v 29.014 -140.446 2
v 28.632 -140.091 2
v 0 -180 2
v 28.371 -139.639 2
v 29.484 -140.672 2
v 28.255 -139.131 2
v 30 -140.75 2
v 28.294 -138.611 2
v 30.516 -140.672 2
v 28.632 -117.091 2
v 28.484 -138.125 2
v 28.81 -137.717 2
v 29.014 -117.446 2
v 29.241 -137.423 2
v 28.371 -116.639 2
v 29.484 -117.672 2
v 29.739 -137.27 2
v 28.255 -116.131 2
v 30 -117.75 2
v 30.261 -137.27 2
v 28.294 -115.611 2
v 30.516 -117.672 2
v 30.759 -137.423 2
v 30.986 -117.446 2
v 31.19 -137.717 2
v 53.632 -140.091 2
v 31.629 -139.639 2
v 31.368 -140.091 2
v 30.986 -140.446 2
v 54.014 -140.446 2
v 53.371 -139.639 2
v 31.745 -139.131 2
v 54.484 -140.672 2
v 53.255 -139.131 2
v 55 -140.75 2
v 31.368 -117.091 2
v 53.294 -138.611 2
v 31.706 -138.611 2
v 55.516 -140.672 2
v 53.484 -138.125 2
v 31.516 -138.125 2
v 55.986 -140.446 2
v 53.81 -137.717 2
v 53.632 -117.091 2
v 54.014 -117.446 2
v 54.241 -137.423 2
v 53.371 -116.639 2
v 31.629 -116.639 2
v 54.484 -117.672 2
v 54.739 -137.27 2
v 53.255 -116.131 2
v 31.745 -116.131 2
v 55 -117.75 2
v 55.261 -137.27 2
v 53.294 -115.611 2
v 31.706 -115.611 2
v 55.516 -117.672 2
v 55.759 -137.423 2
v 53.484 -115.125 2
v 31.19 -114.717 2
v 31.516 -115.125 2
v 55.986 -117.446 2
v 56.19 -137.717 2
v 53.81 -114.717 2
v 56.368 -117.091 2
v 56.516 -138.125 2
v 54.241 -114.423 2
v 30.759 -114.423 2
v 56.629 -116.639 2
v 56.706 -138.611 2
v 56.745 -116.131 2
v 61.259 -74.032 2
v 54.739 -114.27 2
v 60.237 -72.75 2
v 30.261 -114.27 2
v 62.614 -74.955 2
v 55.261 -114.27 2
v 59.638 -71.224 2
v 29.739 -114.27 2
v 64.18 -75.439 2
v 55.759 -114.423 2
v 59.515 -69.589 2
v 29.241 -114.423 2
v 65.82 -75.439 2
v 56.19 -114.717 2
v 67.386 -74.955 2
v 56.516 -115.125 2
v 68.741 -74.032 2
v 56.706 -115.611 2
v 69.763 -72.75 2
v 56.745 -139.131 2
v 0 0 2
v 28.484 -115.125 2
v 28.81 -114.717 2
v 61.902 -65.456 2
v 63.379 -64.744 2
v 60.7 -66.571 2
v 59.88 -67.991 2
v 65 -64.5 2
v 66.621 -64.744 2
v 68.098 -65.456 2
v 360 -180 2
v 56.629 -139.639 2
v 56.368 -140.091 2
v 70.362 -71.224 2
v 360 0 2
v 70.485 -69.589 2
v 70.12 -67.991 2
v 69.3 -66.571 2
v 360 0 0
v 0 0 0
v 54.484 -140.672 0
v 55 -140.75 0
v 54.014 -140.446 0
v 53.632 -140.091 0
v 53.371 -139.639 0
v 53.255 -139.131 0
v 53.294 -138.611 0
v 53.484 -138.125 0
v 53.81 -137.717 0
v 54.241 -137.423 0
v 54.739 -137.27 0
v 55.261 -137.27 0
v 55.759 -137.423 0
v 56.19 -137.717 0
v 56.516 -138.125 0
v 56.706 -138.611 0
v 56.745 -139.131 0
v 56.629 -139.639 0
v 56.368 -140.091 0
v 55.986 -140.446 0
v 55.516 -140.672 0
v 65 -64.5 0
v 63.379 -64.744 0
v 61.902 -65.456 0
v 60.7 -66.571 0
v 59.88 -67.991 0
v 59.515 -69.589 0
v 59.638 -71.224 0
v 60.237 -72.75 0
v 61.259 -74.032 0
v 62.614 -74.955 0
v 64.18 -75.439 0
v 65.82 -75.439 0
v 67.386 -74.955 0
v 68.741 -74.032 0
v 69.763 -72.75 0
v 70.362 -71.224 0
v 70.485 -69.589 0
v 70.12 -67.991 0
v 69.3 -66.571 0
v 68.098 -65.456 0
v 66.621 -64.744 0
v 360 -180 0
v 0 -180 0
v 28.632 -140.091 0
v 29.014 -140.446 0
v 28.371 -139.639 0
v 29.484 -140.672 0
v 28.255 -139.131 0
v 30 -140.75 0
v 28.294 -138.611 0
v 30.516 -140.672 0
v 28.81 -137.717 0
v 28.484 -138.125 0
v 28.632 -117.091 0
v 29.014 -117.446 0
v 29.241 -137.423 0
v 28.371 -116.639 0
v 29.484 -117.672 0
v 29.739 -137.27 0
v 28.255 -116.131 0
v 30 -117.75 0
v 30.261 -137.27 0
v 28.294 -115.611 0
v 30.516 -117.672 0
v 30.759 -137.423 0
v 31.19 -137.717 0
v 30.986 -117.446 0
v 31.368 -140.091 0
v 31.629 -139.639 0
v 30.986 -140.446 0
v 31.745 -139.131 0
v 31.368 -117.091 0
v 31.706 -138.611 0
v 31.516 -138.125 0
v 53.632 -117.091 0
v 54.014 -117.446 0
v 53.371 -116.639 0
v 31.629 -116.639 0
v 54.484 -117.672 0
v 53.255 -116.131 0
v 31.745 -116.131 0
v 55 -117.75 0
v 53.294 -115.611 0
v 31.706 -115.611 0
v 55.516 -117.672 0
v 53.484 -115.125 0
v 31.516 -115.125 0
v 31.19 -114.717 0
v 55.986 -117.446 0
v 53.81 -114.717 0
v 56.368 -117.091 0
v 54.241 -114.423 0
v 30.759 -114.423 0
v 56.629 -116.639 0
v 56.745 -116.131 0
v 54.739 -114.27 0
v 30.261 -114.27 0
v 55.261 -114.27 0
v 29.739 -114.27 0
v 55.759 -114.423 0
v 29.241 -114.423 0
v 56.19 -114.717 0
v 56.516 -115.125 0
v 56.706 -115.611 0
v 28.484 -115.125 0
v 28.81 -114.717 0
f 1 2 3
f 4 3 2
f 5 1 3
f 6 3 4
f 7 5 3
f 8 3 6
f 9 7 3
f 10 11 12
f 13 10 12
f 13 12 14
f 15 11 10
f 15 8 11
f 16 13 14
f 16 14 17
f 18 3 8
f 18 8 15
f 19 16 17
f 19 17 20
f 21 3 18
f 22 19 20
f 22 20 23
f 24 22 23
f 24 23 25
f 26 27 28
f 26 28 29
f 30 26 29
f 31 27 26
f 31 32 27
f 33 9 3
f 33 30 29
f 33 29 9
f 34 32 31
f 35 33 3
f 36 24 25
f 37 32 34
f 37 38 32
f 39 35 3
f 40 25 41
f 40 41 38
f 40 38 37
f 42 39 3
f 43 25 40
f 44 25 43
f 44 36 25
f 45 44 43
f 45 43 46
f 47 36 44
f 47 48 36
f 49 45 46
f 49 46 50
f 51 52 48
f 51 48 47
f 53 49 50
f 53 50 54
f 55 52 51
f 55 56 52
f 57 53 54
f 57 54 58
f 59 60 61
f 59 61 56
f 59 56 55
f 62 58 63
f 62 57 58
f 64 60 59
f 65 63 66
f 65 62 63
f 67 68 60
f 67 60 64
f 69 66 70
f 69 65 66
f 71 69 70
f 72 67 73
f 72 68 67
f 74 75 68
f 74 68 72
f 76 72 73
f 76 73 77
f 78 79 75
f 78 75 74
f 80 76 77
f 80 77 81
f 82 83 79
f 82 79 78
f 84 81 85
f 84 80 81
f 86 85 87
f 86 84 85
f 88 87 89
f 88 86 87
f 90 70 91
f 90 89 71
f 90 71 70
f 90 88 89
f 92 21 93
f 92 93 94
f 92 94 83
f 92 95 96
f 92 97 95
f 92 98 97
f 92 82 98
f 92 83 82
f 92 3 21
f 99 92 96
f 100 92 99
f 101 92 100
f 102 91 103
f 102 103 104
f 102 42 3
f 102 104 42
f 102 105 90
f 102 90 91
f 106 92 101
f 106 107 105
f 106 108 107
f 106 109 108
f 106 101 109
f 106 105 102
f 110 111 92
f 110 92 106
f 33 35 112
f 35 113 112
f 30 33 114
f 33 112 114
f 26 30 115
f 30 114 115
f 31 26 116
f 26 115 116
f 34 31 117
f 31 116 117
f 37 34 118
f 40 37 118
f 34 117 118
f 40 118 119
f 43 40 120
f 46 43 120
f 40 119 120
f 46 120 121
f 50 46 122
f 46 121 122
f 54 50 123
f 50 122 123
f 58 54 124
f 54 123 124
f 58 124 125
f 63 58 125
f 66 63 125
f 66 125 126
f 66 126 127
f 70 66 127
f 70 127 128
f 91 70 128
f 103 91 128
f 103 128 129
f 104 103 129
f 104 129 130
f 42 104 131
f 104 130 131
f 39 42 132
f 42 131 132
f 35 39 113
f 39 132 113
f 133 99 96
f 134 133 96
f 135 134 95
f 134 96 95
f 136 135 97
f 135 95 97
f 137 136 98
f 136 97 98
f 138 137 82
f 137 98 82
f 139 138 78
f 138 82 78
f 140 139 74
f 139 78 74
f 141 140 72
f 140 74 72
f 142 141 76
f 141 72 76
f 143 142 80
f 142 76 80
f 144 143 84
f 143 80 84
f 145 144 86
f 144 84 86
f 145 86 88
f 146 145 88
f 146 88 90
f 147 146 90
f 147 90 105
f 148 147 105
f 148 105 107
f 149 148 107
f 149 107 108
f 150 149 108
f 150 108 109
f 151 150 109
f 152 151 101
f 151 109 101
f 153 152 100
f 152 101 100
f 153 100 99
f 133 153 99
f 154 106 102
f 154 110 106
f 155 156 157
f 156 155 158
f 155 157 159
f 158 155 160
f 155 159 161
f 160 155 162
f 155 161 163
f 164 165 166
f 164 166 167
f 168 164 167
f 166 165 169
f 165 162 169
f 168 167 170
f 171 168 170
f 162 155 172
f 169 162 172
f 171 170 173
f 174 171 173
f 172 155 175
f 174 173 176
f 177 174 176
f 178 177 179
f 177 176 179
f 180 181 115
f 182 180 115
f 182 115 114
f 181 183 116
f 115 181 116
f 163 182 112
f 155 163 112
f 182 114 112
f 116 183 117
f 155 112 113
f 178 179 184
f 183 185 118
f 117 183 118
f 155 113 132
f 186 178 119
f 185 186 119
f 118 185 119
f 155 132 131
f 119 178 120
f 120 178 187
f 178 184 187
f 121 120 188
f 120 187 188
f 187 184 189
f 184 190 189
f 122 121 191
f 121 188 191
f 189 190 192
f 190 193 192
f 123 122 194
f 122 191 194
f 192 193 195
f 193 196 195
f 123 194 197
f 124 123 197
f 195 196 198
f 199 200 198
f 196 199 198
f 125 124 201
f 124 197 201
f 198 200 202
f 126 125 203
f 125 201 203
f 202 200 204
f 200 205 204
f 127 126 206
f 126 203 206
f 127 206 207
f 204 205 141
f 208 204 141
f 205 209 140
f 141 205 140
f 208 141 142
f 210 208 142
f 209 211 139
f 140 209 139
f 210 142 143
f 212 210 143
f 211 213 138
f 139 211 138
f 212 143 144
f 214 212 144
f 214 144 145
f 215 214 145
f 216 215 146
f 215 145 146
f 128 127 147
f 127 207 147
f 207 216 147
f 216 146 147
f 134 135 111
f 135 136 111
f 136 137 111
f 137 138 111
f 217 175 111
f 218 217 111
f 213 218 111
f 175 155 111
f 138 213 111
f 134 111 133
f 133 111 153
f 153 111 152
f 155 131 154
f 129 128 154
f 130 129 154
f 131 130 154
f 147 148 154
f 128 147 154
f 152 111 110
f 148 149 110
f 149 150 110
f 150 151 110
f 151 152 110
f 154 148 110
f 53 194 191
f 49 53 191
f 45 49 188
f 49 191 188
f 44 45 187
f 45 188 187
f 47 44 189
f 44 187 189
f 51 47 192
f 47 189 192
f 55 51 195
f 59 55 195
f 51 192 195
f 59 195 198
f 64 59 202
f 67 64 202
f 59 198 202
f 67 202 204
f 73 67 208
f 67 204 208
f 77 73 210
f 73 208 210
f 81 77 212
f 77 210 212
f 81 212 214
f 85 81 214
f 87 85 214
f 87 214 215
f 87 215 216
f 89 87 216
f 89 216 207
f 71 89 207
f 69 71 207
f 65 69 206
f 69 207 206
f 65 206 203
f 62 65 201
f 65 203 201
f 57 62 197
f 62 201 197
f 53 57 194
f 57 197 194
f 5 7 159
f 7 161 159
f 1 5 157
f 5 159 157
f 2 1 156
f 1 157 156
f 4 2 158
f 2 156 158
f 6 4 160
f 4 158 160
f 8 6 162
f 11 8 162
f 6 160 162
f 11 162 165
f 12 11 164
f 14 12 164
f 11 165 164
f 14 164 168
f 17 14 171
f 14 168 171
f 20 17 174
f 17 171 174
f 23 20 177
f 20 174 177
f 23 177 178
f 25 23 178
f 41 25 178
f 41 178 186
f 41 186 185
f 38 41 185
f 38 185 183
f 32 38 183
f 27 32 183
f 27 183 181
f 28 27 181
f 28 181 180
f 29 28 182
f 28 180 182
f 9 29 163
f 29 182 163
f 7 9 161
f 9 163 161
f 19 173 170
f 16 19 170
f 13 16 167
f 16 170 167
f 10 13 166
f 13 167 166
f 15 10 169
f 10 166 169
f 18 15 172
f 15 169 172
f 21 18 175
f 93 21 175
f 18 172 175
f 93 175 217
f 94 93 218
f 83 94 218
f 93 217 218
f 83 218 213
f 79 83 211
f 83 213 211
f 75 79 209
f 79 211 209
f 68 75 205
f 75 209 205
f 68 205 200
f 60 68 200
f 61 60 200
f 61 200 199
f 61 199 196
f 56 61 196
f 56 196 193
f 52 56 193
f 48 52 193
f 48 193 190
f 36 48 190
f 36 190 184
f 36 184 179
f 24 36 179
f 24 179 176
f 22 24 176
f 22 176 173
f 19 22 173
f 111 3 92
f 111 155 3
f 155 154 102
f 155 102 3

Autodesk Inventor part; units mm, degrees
ref_plane "YZ Plane" through (0, 0, 0) normal (1, 0, 0) x (0, 1, 0)
ref_plane "XZ Plane" through (0, 0, 0) normal (0, 1, 0) x (-1, 0, 0)
ref_plane "XY Plane" through (0, 0, 0) normal (0, 0, 1) x (1, 0, 0)
sketch "スケッチ1" plane through (0, 0, 0) normal (0, 0, 1) x (1, 0, 0)
  line L0 (0, 0) -> (360, 0)
  line L1 (360, 0) -> (360, -180)
  line L2 (360, -180) -> (0, -180)
  line L3 (0, -180) -> (0, 0)
  dimension "d0" = 360
  dimension "d1" = 180
extrude "押し出し1" add sketch "スケッチ1" along normal blind 2
sketch "スケッチ3" plane through (0, 0, 2) normal (0, 0, 1) x (1, 0, 0)
  line L0 (360, 0) -> (0, 0) projected
  line L1 (0, 0) -> (0, -180) projected
  point P0 (55, -139)
  point P1 (30, -139)
  point P2 (55, -116)
  point P3 (30, -116)
  dimension "d14" = 139
  dimension "d15" = 55
  dimension "d18" = 25
  dimension "d21" = 23
hole "穴2" at (55, -139, 2) at (30, -139, 2) at (55, -116, 2) at (30, -116, 2) direction (0, 0, -1) diameter 3.5 end through all
sketch "スケッチ4" plane through (0, 0, 0) normal (0, 0, -1) x (-1, 0, 0)
  line L0 (-360, 0) -> (0, 0) projected
  line L1 (0, 0) -> (0, -180) projected
  point P0 (-65, -70)
  dimension "d31" = 70
  dimension "d32" = 65
hole "穴3" at (65, -70, 0) direction (0, 0, 1) diameter 11 end through all
properties part number "後ろカバー" material "ABS プラスチック"
